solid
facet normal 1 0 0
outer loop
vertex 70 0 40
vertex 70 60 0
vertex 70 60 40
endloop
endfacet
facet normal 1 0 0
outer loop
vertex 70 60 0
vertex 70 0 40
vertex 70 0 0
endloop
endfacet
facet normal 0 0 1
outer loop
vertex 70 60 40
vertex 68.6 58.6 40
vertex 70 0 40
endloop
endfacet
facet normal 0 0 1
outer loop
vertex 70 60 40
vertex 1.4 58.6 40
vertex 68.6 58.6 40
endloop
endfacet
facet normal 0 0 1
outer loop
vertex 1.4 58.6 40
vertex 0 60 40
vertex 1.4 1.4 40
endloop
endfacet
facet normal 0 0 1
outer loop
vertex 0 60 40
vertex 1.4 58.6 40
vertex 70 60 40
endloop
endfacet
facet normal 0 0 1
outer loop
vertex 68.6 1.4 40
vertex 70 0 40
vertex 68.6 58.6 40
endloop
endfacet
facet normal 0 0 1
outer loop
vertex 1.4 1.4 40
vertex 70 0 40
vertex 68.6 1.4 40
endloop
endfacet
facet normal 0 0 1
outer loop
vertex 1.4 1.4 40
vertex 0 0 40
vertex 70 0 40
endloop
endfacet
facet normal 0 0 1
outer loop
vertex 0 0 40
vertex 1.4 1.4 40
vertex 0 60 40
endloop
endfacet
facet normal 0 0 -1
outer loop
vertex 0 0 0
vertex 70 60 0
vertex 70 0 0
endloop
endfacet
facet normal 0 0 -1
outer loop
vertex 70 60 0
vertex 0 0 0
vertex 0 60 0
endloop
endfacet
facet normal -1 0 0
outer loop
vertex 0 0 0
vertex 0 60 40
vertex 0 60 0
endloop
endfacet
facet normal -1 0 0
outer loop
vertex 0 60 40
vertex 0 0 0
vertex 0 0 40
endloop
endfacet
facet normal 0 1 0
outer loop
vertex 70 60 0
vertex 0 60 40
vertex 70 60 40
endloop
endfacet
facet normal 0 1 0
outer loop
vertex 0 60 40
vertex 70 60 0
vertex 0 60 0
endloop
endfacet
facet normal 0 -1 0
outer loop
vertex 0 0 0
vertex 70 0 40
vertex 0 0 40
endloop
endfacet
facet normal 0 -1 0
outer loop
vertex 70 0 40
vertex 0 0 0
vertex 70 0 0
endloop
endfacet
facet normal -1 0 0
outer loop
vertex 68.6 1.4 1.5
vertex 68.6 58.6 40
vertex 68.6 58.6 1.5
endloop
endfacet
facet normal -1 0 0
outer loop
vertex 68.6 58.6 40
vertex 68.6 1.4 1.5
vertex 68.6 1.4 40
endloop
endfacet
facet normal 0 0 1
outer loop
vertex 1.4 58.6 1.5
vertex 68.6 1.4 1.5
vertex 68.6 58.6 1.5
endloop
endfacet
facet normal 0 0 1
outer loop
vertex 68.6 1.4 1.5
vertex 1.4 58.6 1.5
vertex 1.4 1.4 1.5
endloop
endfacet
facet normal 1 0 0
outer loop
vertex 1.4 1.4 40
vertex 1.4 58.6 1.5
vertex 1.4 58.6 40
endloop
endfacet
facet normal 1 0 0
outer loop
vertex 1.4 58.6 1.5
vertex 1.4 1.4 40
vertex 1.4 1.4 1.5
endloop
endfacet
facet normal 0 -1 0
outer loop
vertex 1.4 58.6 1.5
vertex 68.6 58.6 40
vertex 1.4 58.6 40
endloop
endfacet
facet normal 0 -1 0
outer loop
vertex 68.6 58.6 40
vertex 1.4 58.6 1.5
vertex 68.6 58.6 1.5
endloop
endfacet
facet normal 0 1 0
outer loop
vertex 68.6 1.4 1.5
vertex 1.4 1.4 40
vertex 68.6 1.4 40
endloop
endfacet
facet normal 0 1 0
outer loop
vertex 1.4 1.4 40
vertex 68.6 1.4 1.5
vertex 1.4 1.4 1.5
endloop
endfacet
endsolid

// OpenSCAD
$fn = 32;

// ----------------------------------------------------------------------
// Open box: 1.4 mm walls
// ----------------------------------------------------------------------

// --- parameters (mm) ---
box_l = 70;               // outer length, X
box_w = 60;               // outer width, Y
box_h = 40;               // outer height, Z
wall = 1.4;               // wall thickness
floor = 1.5;              // floor thickness

difference() {
  cube([box_l, box_w, box_h]);
  translate([wall, wall, floor])
    cube([box_l - 2 * wall, box_w - 2 * wall, box_h]);
}
